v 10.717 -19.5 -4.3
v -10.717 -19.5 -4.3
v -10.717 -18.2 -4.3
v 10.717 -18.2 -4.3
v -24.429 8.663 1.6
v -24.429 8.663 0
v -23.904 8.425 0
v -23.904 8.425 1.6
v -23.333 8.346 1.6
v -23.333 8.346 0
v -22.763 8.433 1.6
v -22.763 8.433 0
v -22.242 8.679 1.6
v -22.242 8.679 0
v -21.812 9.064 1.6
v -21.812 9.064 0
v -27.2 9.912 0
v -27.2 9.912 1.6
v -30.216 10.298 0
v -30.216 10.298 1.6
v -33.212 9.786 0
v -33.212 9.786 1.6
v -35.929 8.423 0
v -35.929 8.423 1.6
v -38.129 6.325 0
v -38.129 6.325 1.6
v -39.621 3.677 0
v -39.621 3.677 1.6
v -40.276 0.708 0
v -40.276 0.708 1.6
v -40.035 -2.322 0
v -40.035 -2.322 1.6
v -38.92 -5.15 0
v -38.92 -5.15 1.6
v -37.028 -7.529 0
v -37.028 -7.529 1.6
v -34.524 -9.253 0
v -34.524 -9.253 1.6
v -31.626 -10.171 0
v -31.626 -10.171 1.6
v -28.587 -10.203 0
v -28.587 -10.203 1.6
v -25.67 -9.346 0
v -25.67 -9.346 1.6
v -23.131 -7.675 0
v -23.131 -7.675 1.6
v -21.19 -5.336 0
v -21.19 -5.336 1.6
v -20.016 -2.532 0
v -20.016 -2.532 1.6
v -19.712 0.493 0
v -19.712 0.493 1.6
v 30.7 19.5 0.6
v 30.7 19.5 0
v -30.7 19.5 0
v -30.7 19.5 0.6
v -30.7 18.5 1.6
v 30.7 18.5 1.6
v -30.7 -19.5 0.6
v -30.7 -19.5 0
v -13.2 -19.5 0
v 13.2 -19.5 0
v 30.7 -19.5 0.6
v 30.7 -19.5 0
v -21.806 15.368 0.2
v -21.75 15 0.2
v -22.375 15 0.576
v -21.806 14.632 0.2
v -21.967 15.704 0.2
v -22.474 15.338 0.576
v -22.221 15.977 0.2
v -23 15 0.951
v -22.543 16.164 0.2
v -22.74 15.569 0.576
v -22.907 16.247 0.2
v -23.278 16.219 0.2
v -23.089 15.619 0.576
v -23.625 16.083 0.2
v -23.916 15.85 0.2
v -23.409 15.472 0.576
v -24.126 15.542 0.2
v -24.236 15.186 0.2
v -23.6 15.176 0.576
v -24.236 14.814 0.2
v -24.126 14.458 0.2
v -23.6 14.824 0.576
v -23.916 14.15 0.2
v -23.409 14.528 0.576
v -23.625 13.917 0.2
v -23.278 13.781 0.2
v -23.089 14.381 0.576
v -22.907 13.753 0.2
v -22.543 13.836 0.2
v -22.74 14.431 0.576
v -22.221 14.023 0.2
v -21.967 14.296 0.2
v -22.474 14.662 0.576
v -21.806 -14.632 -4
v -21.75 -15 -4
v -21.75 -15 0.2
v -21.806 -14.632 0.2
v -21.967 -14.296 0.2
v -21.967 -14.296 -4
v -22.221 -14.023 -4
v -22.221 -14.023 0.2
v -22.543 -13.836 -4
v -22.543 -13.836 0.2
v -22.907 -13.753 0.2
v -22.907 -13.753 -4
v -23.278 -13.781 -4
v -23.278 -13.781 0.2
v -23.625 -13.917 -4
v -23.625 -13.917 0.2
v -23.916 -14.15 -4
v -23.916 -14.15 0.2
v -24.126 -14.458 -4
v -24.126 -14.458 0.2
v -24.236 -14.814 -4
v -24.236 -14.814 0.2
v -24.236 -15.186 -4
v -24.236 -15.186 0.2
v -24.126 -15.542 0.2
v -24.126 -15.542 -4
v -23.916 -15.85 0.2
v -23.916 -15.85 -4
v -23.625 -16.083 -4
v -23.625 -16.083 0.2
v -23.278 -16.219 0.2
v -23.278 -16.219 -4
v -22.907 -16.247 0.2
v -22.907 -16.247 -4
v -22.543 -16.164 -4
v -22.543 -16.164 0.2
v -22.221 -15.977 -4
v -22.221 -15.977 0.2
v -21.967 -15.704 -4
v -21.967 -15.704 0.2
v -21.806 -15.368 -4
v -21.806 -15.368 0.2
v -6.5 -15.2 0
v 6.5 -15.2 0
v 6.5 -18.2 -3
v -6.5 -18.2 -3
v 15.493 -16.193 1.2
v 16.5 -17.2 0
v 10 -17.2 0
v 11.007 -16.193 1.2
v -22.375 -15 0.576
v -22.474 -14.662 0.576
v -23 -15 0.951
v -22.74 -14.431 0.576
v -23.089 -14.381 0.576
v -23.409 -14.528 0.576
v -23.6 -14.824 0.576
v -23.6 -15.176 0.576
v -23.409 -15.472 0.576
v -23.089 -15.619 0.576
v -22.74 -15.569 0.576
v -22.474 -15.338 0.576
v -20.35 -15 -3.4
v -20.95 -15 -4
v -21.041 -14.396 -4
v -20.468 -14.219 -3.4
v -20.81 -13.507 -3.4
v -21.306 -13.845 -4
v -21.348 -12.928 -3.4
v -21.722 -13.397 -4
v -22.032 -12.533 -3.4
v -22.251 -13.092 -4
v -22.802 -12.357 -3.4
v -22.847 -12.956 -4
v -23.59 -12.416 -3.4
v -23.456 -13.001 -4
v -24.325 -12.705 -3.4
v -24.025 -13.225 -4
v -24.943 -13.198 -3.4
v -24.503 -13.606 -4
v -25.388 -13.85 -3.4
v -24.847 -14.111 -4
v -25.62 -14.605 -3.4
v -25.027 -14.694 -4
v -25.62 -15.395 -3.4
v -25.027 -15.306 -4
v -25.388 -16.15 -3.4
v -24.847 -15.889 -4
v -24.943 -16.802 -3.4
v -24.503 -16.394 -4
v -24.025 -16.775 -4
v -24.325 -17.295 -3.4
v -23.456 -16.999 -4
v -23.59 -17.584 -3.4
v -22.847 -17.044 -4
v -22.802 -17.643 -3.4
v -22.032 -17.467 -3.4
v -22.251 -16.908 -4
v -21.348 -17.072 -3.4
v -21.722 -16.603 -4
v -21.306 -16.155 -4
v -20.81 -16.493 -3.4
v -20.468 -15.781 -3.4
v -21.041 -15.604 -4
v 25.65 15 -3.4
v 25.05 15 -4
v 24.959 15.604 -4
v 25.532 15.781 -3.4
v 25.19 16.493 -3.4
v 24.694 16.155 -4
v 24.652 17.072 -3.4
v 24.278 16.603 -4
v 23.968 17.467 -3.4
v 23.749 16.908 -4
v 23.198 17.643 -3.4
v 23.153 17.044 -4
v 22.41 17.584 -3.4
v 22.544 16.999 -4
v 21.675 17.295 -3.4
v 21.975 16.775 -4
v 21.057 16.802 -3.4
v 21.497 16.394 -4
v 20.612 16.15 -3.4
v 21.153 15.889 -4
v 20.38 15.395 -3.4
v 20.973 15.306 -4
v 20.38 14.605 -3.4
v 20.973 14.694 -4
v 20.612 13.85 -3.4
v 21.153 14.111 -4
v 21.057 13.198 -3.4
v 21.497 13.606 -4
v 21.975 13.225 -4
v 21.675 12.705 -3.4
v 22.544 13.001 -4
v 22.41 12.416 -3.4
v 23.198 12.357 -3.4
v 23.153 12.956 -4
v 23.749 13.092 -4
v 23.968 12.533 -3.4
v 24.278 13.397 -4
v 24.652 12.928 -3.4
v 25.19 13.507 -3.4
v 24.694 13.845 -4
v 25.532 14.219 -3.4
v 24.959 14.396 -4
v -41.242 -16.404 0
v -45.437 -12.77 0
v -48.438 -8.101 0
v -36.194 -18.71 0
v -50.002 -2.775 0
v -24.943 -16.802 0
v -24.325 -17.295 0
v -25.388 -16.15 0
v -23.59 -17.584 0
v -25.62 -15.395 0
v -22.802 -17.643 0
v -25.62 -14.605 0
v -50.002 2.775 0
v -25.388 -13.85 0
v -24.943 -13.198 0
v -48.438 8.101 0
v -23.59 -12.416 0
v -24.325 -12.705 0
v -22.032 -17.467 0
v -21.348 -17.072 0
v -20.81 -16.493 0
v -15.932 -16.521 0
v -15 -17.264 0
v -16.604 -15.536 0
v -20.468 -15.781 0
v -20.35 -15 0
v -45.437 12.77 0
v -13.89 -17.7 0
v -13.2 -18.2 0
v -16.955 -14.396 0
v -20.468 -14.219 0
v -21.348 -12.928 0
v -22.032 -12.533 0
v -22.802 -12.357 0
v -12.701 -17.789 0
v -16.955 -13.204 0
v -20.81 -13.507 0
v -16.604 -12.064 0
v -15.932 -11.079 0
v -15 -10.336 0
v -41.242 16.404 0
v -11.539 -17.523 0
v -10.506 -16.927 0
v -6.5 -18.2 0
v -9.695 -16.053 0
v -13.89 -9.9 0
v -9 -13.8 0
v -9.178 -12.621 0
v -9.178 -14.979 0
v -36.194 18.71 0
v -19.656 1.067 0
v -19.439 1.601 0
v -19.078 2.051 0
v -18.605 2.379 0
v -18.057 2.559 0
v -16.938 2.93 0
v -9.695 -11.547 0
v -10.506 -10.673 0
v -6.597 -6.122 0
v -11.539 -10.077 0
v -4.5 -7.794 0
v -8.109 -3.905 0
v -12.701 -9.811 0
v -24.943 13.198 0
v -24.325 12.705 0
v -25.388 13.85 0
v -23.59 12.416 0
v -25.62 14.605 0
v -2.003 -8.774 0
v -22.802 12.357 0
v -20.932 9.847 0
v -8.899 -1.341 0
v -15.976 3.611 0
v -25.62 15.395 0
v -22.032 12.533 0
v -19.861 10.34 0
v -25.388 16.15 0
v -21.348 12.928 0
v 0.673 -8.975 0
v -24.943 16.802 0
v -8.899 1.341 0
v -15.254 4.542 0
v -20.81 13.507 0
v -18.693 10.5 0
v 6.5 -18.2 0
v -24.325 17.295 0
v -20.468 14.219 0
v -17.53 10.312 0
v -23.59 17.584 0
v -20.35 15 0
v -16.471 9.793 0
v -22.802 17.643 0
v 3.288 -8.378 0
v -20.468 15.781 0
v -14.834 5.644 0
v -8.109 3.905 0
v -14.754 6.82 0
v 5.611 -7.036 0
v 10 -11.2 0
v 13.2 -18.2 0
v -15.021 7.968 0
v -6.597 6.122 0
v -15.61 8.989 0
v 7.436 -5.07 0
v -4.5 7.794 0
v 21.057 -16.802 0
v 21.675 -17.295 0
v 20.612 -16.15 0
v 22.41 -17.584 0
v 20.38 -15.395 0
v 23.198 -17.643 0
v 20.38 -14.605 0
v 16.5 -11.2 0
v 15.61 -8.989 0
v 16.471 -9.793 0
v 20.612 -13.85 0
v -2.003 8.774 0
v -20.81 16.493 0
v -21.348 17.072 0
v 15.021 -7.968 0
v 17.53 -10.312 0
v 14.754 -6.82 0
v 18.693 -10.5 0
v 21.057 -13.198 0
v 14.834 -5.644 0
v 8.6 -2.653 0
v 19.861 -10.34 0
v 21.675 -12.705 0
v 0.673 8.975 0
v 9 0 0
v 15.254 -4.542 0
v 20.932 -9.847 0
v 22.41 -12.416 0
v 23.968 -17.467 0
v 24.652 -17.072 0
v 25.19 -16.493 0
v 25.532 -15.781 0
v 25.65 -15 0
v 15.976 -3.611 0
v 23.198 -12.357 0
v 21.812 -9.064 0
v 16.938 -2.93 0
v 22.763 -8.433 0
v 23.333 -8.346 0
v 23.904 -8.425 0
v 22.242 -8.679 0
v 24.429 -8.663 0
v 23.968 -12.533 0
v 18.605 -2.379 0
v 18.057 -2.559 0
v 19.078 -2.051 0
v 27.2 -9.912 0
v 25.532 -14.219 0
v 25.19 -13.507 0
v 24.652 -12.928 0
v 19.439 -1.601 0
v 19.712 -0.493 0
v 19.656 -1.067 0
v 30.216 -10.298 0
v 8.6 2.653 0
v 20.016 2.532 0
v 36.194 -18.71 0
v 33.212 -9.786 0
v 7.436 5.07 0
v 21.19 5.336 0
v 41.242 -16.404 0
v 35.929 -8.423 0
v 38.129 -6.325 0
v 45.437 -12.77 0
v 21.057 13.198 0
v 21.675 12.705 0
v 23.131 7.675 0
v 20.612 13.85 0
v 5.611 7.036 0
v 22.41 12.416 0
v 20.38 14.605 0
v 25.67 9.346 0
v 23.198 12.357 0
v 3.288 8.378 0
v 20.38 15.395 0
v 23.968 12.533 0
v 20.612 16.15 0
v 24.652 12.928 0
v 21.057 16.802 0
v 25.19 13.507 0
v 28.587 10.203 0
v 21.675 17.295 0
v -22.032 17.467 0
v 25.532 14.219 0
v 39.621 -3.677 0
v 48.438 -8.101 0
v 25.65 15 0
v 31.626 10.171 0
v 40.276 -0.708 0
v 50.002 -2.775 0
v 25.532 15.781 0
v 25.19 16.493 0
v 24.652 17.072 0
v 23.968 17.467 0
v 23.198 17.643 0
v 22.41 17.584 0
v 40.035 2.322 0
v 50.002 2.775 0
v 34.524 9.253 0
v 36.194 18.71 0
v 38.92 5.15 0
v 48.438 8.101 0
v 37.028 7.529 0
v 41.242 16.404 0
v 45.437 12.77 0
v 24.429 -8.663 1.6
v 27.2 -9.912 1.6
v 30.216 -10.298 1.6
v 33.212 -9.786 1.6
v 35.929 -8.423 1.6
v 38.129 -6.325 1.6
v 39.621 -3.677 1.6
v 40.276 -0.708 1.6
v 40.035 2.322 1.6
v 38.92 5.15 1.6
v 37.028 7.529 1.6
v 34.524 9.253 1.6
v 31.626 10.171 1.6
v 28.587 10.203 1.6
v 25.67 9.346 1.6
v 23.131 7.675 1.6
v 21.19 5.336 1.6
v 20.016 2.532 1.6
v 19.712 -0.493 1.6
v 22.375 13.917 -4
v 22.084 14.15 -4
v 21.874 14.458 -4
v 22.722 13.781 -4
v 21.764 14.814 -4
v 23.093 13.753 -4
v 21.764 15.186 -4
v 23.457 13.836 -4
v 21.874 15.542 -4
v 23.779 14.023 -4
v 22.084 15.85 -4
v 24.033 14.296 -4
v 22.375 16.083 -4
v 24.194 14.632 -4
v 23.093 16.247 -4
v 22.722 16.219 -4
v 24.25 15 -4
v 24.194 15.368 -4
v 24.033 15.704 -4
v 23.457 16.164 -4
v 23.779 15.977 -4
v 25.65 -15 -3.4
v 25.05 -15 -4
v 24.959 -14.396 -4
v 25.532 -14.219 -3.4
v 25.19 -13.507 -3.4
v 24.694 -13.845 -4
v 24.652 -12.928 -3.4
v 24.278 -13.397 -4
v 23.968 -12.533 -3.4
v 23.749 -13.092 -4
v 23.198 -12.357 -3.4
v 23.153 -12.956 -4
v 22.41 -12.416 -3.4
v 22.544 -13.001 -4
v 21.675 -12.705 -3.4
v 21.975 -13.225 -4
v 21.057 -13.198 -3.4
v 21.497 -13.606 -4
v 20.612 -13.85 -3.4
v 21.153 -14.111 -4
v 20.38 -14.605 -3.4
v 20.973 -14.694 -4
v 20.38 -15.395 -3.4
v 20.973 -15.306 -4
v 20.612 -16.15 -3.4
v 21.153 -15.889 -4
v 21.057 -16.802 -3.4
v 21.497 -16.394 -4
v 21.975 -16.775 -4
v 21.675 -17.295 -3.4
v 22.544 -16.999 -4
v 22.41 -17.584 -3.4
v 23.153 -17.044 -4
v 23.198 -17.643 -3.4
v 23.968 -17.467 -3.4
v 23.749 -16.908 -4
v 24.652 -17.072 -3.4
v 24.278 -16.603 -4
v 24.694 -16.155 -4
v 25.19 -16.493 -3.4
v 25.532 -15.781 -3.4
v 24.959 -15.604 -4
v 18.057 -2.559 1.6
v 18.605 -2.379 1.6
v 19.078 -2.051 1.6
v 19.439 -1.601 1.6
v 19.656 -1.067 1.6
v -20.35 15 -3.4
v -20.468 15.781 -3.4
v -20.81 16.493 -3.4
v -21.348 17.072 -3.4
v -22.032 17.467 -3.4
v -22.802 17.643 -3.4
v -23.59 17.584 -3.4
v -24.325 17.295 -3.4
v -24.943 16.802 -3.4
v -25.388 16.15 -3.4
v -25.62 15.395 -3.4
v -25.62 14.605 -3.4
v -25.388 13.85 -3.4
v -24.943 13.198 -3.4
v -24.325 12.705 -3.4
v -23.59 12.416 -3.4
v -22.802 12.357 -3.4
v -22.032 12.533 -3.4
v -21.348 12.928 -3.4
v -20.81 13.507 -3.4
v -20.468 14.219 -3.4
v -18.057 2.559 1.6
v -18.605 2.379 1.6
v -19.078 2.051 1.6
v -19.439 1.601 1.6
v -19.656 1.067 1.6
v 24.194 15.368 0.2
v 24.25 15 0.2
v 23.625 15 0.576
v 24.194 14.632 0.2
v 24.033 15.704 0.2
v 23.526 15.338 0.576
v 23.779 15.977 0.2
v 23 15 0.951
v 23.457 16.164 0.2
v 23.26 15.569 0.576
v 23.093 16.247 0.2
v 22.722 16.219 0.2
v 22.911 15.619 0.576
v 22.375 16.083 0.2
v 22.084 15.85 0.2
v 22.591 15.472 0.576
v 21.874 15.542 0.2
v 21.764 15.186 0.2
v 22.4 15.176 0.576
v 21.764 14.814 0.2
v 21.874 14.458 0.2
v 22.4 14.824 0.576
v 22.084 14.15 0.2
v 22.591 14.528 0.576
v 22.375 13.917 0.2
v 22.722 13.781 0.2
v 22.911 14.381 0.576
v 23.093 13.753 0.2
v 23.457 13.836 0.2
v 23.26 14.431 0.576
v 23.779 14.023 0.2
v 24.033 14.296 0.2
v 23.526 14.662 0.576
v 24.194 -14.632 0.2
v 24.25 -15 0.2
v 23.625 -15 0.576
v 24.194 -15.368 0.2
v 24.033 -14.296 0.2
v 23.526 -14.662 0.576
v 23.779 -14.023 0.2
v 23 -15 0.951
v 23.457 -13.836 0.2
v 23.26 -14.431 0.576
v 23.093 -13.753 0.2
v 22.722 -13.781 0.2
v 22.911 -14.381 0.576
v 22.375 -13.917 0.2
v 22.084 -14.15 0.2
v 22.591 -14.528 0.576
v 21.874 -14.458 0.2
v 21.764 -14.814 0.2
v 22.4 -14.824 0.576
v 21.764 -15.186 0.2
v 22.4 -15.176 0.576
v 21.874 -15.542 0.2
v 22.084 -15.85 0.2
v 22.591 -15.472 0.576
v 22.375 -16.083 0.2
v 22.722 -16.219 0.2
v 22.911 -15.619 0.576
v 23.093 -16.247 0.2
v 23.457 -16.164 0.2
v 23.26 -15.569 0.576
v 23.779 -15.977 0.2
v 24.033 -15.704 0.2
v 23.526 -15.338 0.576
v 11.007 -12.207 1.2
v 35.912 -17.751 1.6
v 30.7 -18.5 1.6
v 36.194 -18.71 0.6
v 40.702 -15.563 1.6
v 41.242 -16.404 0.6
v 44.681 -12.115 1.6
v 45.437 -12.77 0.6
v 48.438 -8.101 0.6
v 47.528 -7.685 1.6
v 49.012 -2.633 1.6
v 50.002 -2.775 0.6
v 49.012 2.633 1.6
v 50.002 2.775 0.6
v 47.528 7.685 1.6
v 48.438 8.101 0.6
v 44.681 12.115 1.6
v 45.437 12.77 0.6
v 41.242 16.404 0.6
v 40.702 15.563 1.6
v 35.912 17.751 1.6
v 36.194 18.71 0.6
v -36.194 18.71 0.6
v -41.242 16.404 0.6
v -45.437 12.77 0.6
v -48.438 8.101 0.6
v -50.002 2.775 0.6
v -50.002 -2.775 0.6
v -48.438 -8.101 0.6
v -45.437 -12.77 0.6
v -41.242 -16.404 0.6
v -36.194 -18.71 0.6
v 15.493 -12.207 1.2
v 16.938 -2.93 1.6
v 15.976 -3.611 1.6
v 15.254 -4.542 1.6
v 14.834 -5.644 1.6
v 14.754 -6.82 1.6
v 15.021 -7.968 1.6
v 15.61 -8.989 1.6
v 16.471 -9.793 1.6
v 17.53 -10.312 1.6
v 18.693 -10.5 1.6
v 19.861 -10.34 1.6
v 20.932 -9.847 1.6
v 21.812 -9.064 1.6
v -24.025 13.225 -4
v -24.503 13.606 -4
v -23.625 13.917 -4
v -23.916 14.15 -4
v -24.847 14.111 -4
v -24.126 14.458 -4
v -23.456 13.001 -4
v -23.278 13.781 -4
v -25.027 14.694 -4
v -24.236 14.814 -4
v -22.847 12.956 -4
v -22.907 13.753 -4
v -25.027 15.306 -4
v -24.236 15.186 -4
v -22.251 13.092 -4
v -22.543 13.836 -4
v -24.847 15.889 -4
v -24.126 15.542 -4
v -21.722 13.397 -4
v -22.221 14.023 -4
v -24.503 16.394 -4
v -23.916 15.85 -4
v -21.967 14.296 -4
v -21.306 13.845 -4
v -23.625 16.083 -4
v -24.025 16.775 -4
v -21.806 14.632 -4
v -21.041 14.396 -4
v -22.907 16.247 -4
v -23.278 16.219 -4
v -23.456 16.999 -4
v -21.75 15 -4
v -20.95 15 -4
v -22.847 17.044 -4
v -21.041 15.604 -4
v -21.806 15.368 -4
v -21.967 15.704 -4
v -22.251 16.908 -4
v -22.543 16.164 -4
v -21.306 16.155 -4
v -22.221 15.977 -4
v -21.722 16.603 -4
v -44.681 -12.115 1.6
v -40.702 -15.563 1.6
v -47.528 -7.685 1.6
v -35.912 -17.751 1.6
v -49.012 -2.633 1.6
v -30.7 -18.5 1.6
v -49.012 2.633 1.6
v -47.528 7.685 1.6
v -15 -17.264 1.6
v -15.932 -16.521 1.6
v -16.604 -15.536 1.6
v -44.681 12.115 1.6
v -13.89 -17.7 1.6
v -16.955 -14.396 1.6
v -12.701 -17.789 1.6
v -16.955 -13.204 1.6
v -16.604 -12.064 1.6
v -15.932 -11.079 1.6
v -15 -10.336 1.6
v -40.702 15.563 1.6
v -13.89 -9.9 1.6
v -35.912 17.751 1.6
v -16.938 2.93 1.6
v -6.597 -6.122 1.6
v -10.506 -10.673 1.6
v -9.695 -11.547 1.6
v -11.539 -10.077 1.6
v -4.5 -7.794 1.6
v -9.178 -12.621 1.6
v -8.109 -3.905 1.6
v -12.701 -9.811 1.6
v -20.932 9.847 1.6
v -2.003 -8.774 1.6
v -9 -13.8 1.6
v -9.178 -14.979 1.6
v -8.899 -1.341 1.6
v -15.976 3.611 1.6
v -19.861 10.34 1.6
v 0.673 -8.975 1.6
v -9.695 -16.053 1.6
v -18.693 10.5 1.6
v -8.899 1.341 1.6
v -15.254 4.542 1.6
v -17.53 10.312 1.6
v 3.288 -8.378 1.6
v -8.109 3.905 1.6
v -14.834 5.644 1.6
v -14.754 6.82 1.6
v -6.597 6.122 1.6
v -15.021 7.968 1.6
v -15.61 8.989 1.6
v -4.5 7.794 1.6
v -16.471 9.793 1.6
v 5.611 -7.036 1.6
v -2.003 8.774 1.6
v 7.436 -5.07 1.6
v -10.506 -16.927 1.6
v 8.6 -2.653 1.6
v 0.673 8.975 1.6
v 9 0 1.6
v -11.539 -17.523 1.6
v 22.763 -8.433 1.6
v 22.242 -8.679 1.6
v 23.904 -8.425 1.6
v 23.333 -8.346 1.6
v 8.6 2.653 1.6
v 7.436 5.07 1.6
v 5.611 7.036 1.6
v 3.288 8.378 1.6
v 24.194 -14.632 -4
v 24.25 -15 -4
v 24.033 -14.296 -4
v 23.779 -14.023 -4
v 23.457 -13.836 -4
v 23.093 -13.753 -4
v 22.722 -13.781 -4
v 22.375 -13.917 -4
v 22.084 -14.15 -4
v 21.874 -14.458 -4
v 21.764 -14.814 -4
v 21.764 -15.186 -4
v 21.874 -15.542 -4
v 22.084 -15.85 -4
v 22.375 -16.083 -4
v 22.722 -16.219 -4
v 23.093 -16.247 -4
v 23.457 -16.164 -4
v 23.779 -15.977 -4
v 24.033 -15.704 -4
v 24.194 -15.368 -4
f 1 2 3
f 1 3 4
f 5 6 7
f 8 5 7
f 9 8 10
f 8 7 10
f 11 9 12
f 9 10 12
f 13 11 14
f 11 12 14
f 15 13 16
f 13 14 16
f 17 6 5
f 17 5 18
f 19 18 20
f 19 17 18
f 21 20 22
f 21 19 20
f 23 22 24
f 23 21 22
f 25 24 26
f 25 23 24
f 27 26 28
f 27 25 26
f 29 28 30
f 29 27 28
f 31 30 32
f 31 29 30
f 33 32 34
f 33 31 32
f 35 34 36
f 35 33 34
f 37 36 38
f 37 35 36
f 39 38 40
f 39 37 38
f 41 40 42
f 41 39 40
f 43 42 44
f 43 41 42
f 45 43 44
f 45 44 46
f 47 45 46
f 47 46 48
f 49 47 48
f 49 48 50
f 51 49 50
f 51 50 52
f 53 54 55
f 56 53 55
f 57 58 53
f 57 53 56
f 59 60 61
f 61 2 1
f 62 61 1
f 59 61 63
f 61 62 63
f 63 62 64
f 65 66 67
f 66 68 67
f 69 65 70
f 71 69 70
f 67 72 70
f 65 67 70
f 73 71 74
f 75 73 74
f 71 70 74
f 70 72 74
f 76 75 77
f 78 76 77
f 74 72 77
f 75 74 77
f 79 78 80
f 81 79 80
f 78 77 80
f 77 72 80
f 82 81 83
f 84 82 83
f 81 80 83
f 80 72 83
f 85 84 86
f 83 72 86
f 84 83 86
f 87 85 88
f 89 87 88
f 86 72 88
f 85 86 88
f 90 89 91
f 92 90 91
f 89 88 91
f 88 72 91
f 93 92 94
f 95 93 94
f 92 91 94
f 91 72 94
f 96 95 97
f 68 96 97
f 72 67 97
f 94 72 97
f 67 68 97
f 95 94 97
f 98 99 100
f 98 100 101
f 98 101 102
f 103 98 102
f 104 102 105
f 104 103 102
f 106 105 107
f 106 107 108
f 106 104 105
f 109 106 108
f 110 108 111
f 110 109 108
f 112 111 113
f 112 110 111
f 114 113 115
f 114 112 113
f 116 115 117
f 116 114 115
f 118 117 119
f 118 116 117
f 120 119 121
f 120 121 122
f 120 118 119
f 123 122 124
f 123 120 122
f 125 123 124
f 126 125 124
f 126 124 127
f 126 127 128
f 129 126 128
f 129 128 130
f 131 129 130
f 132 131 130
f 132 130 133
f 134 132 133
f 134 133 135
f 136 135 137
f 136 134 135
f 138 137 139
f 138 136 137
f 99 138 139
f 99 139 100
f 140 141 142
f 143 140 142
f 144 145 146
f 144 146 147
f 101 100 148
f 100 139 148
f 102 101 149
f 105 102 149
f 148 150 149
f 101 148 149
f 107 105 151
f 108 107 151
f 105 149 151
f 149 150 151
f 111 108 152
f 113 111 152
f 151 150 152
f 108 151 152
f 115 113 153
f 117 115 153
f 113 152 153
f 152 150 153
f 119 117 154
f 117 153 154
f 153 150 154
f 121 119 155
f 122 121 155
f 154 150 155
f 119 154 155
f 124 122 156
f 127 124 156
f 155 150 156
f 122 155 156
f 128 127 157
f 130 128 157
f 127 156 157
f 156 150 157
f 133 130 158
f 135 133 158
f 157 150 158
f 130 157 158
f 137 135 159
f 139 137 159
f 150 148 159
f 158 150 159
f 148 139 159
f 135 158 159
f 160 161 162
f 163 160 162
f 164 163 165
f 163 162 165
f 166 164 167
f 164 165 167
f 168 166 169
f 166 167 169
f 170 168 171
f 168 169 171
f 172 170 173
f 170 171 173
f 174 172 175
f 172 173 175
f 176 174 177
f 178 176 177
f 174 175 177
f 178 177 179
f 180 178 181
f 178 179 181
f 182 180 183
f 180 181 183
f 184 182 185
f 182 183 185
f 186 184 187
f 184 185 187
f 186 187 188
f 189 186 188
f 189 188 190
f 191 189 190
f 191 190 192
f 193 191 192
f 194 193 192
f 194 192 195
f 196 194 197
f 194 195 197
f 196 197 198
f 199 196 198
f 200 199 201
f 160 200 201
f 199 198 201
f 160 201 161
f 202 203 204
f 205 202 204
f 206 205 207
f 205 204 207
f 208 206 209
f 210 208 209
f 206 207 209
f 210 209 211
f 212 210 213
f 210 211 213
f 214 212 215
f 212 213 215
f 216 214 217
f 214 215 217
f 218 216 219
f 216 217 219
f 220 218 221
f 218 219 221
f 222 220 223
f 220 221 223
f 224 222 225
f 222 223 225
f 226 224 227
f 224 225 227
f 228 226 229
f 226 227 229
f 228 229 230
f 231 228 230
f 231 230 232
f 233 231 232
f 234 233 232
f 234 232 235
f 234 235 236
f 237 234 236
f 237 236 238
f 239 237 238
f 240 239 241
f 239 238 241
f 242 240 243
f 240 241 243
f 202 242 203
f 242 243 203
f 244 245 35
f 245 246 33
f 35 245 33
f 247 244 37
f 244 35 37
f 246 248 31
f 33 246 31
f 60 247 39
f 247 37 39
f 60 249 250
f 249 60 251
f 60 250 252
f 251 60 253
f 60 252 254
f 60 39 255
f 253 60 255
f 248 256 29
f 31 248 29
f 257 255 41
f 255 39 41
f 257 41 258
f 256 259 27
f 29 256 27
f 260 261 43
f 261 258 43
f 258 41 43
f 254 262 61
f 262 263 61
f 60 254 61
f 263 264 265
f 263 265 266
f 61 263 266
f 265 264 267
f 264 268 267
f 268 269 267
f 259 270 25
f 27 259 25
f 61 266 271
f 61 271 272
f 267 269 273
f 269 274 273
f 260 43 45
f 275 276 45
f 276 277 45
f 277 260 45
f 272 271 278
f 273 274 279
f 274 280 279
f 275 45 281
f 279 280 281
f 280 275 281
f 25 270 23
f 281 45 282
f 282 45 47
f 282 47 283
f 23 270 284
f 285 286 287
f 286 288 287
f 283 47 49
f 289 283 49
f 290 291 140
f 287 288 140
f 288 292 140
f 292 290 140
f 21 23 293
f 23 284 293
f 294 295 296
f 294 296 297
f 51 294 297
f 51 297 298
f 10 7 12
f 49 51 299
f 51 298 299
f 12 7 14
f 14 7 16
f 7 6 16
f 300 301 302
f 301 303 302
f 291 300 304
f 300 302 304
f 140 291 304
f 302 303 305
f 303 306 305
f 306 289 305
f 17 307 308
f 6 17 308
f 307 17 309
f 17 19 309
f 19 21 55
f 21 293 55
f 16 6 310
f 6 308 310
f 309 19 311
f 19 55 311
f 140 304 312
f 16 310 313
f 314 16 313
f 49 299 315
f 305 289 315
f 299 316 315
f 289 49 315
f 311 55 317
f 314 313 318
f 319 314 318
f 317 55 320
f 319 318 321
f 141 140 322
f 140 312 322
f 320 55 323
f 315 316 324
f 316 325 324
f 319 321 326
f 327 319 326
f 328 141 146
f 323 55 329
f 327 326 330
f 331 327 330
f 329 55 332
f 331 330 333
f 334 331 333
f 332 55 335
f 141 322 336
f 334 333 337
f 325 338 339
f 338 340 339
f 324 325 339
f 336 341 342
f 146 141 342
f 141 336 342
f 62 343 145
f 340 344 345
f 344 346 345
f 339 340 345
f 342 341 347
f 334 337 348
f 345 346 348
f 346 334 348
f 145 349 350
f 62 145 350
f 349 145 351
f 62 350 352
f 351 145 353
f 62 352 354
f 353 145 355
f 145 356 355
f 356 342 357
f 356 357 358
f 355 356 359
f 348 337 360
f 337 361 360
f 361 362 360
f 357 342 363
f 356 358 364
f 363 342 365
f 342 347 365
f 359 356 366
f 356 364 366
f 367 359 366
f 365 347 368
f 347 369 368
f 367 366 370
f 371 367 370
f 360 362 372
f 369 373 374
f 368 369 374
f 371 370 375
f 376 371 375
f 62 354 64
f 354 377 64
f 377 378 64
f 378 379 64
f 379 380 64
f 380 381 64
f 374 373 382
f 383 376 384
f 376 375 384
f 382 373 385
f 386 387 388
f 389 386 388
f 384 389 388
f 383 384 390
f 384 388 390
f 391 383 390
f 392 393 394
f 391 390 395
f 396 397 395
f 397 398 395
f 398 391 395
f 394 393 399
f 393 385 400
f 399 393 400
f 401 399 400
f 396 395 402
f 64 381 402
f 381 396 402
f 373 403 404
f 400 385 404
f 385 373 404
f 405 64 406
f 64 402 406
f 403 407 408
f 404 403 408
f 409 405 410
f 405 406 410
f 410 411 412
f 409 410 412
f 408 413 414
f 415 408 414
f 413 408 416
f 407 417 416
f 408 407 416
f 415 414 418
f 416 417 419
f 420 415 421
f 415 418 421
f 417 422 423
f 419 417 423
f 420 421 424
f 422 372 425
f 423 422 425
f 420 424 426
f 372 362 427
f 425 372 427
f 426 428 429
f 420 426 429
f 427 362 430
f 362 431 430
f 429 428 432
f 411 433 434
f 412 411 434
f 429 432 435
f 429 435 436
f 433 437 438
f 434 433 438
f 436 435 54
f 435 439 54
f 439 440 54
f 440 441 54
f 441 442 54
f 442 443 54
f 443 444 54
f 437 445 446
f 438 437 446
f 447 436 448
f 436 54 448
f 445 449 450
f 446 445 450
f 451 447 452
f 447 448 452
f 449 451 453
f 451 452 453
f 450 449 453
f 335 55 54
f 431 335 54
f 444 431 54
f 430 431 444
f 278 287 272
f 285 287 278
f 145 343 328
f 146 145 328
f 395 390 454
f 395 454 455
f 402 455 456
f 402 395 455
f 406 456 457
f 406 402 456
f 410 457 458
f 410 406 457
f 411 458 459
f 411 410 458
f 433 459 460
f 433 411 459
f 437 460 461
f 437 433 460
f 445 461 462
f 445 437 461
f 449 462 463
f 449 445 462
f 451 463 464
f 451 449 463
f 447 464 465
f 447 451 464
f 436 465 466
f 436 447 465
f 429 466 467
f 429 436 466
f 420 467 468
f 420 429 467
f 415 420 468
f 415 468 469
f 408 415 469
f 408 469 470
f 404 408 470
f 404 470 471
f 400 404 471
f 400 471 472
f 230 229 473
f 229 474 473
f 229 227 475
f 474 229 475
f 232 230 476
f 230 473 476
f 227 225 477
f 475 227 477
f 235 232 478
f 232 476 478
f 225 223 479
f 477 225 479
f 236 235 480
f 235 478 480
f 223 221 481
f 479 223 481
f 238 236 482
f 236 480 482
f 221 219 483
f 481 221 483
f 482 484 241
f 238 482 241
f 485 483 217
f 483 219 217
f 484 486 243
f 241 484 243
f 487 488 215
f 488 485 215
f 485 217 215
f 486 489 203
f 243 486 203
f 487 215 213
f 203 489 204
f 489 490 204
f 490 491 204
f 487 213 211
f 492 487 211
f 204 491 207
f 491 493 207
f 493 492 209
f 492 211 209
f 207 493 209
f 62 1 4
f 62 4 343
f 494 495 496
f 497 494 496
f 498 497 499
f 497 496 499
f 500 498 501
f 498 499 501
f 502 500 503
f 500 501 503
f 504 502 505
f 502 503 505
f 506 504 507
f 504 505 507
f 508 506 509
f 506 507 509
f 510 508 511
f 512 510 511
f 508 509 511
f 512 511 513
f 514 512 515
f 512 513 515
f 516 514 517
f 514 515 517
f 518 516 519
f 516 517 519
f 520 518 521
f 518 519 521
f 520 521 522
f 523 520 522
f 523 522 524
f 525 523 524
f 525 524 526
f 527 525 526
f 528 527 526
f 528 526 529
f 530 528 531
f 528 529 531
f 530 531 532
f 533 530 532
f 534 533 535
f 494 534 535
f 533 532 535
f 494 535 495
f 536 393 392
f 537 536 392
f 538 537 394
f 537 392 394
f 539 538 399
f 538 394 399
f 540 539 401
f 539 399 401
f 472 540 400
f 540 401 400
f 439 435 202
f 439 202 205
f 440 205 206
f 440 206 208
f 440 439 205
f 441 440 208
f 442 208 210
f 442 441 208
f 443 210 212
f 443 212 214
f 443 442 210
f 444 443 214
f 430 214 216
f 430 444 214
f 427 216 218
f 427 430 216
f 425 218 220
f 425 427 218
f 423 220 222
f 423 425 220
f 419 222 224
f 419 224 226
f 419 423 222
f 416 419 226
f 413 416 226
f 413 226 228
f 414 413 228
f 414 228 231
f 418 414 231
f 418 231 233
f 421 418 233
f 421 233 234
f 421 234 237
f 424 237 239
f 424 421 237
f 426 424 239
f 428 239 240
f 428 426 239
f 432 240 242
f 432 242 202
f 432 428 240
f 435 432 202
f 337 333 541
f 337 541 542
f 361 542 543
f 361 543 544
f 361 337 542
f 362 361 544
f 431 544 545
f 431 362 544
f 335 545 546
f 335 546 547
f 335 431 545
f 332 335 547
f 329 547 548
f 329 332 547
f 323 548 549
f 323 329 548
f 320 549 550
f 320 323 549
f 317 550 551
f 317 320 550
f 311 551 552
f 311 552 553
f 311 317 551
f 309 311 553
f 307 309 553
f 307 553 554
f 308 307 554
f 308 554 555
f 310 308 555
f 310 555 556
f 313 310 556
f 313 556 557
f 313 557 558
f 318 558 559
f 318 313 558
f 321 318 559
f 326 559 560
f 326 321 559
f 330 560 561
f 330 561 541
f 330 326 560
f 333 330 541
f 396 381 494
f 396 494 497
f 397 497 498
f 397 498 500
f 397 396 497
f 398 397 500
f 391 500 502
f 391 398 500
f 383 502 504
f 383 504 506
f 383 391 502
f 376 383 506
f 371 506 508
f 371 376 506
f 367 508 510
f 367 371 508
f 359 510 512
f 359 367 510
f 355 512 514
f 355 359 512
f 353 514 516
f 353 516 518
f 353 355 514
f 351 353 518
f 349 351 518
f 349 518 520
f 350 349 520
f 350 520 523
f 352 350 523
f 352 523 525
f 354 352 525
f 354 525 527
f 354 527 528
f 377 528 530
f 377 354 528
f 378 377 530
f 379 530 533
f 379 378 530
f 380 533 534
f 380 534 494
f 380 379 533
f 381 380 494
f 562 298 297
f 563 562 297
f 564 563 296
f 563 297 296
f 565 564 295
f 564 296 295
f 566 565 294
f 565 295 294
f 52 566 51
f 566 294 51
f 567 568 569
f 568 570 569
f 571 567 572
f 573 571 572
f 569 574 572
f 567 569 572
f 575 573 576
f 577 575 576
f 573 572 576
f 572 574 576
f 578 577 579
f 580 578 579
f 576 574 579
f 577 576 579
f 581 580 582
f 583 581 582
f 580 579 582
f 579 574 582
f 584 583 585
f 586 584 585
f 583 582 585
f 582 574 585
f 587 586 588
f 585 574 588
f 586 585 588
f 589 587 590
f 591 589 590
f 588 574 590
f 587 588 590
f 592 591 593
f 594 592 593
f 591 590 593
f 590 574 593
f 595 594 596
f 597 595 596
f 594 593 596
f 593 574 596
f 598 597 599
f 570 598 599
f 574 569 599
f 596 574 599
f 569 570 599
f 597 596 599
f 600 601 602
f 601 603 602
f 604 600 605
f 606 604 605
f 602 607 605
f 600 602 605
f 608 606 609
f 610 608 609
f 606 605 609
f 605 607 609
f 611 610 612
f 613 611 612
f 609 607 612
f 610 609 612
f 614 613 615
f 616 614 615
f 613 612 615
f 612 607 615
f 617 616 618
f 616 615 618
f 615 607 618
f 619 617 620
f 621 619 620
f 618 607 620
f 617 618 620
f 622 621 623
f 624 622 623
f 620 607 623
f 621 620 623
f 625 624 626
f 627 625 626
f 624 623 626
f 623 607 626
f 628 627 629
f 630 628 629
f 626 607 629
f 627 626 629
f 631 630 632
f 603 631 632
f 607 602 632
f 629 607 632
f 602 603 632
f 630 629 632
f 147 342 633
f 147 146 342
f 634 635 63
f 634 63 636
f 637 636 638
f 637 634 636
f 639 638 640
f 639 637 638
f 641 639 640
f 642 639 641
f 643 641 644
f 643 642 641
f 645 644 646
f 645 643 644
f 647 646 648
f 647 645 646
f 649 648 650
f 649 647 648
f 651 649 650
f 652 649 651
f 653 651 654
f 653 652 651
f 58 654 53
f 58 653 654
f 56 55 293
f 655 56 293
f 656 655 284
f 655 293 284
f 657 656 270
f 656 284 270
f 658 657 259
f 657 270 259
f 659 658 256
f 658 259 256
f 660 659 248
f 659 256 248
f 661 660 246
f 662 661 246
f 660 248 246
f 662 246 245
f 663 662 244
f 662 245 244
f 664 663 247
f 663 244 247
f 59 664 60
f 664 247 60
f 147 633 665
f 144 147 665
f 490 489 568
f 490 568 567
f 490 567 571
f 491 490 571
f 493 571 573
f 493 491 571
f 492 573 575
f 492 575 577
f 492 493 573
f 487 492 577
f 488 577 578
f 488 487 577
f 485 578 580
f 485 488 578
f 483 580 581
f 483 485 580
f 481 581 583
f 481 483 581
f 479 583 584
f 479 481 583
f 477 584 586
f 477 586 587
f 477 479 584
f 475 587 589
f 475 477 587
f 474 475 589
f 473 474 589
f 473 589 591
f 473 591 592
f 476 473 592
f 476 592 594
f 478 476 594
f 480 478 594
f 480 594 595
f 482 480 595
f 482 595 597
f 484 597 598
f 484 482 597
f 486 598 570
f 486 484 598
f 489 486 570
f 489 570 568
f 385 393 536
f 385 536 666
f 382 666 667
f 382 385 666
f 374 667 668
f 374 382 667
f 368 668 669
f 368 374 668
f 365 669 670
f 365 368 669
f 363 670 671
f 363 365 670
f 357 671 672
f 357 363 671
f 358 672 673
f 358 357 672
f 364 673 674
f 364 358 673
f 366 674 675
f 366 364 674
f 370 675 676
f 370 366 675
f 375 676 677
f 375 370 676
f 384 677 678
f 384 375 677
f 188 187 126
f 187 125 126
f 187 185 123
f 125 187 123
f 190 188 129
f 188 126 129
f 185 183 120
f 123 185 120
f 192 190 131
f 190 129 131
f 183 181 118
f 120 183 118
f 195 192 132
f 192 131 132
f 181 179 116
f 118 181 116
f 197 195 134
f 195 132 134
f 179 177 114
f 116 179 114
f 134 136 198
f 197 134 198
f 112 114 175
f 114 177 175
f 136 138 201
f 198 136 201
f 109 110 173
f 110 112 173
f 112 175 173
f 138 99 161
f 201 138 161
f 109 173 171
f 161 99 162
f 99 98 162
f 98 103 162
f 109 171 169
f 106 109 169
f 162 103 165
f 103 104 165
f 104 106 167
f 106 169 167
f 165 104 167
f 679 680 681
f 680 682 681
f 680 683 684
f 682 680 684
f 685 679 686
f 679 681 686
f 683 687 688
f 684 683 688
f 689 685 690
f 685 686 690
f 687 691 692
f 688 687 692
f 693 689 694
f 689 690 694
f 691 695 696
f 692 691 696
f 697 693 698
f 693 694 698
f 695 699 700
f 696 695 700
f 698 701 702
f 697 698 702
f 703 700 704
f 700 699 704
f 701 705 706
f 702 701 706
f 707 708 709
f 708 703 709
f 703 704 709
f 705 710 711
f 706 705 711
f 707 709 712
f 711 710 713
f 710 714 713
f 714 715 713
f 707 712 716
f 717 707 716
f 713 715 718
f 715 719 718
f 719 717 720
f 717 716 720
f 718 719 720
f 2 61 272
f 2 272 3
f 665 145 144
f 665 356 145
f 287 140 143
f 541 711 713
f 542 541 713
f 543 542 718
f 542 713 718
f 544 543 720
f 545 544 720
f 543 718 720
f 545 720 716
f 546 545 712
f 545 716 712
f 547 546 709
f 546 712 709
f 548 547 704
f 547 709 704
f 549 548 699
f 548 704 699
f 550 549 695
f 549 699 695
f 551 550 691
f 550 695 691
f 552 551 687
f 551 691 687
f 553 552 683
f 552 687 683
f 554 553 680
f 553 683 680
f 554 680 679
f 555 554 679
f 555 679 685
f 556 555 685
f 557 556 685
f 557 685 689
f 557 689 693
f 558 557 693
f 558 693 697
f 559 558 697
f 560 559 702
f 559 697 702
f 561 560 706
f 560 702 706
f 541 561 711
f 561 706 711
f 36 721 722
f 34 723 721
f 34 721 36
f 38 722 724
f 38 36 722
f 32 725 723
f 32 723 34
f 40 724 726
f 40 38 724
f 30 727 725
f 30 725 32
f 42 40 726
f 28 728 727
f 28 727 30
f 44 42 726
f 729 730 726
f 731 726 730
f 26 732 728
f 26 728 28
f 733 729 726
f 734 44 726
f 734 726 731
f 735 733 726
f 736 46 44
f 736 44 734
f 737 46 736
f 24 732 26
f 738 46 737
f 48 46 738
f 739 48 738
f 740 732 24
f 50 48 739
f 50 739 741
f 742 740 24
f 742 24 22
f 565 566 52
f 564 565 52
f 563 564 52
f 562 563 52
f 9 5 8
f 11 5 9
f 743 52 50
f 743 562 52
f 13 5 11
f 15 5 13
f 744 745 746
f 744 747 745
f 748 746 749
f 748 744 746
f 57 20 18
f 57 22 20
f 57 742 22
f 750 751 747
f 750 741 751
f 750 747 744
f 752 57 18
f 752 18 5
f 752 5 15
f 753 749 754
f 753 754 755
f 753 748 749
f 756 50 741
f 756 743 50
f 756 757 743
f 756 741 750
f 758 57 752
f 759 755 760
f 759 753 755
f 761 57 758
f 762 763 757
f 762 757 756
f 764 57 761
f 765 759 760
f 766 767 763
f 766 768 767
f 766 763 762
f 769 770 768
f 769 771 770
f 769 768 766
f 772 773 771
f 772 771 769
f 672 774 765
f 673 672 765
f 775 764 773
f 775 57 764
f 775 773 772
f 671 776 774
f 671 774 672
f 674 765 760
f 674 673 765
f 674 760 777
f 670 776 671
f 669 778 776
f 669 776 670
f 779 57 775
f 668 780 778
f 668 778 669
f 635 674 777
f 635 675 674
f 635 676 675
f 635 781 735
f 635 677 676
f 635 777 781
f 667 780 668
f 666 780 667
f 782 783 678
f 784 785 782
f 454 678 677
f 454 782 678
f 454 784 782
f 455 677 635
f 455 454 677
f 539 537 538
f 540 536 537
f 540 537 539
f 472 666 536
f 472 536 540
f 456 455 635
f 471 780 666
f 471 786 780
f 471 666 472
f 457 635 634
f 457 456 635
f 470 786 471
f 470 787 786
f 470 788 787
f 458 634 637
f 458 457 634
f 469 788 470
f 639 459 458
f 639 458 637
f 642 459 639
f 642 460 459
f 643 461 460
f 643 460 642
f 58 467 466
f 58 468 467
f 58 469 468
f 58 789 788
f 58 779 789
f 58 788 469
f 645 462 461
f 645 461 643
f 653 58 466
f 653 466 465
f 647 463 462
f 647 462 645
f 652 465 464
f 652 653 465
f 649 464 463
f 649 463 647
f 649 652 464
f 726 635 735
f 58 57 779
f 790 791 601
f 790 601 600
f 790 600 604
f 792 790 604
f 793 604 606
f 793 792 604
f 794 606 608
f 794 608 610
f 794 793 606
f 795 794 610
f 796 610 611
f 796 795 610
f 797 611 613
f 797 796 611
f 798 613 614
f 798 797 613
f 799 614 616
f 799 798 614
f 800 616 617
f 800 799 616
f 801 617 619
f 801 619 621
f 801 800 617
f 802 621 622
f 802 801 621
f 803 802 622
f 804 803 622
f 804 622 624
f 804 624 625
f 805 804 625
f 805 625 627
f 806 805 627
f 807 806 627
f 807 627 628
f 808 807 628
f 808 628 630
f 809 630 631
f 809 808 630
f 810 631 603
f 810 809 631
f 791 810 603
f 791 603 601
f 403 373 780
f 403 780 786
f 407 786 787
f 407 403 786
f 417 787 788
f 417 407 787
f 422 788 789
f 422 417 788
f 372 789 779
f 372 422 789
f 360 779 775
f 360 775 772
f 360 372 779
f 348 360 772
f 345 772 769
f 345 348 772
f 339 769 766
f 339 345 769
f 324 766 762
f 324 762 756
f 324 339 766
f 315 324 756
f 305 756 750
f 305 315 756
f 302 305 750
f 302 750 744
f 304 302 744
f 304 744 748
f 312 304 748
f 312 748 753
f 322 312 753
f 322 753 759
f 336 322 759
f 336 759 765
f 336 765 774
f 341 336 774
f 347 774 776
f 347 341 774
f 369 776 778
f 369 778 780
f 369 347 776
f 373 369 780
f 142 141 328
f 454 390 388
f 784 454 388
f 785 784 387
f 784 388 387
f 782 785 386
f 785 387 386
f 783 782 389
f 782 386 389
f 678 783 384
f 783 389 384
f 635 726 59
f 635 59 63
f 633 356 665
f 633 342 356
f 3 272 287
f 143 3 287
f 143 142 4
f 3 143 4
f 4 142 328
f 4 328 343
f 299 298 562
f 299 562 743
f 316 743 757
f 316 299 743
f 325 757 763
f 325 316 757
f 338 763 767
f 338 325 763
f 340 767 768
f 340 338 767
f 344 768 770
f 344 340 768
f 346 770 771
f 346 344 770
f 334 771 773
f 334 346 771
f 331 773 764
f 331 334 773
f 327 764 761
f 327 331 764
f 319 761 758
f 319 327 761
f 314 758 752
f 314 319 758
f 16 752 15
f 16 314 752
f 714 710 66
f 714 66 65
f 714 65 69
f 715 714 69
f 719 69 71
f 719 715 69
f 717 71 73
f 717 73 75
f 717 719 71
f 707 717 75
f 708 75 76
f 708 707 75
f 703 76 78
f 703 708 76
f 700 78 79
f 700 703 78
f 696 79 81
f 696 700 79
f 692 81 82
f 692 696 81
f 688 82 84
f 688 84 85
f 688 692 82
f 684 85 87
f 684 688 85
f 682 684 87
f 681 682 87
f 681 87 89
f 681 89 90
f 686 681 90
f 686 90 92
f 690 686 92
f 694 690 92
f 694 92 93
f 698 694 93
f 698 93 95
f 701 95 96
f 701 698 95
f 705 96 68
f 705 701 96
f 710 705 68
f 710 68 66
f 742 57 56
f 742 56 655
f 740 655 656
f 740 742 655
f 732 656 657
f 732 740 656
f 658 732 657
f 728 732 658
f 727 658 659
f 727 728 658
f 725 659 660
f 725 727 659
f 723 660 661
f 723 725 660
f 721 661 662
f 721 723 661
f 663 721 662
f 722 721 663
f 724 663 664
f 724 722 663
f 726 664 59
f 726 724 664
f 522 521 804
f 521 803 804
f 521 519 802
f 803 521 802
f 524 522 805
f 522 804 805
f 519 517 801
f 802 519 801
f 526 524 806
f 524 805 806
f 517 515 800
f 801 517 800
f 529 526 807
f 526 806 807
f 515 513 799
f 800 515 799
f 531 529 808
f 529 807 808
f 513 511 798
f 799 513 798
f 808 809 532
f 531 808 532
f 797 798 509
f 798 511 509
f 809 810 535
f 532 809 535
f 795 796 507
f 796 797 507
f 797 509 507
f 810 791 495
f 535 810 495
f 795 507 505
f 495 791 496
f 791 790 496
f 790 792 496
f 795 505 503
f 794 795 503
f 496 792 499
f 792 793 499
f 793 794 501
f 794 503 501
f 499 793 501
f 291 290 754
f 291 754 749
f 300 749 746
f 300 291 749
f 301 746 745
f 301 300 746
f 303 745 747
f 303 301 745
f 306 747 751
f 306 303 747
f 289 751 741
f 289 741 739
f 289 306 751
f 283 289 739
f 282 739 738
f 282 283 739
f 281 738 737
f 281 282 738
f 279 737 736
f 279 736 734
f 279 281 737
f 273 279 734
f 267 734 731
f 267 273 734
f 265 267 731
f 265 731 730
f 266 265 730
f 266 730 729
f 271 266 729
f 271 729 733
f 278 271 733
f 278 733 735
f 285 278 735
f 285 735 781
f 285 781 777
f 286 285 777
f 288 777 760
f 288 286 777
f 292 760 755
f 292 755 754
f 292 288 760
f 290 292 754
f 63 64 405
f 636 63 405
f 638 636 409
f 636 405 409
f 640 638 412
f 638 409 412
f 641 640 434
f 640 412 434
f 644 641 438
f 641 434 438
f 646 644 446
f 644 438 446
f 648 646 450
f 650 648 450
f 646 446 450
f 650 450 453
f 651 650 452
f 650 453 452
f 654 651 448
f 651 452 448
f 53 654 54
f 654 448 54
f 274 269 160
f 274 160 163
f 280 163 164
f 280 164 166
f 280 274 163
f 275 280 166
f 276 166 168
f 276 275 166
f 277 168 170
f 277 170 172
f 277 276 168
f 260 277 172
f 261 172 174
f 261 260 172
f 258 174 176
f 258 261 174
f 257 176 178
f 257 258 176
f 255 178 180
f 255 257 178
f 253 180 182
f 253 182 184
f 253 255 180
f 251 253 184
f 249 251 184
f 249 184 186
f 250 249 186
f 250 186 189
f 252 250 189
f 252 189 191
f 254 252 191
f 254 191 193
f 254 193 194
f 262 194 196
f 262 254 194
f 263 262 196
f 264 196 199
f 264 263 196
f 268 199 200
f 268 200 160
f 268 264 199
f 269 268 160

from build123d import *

# Parameters (mm, degrees)
SKETCH014_R     = 9
SKETCH014_R_2   = 4
PAD003_DEPTH    = 1.6
SKETCH015_W     = 6.5
SKETCH015_H     = 6
POCKET007_DEPTH = 1.2
POCKET007_TAPER = 40
SKETCH016_R     = 2.65
PAD004_DEPTH    = 4
SKETCH017_R     = 1.25
HOLE001_DEPTH   = 4.2
HOLE001_TIPS_R  = 1.25
PAD005_DEPTH    = 1.3
PAD006_DEPTH    = 6.5
CHAMFER003_SIZE = 0.6
CHAMFER004_SIZE = 1


with BuildPart() as part:
    # Sketch014 → Pad003 (new body)
    with BuildSketch(Plane.XY):
        with BuildLine():
            Line((-30.7, -19.5), (30.7, -19.5))
            ThreePointArc((30.7, -19.5), (50.2, 0), (30.7, 19.5))
            Line((30.7, 19.5), (-30.7, 19.5))
            ThreePointArc((-30.7, 19.5), (-50.2, 0), (-30.7, -19.5))
        make_face()
        Circle(SKETCH014_R, mode=Mode.SUBTRACT)
        with Locations((-13, -13.8)):
            Circle(SKETCH014_R_2, mode=Mode.SUBTRACT)
        with BuildLine():
            ThreePointArc((-24.429009, 8.663375), (-38.920062, -5.15), (-19.711802, 0.492933))
            ThreePointArc((-18.056619, 2.559098), (-19.275002, 1.839074), (-19.711802, 0.492933))
            ThreePointArc((-18.056619, 2.559098), (-15.277568, 8.5), (-21.812065, 9.063722))
            ThreePointArc((-24.429009, 8.663375), (-23.044816, 8.368584), (-21.812065, 9.063722))
        make_face(mode=Mode.SUBTRACT)
        with BuildLine():
            ThreePointArc((24.429009, -8.663375), (38.920062, 5.15), (19.711802, -0.492933))
            ThreePointArc((18.056619, -2.559098), (19.275002, -1.839074), (19.711802, -0.492933))
            ThreePointArc((18.056619, -2.559098), (15.277568, -8.5), (21.812065, -9.063722))
            ThreePointArc((24.429009, -8.663375), (23.044816, -8.368584), (21.812065, -9.063722))
        make_face(mode=Mode.SUBTRACT)
    extrude(amount=PAD003_DEPTH)

    # Sketch015 → Pocket007 (cut)
    with BuildSketch(Plane.XY):
        with Locations((13.25, -14.2)):
            Rectangle(SKETCH015_W, SKETCH015_H)
    extrude(amount=POCKET007_DEPTH, taper=POCKET007_TAPER, mode=Mode.SUBTRACT)

    # Sketch016 → Pad004 (join)
    with BuildSketch(Plane.XY):
        with Locations((-23, 15)):
            Circle(SKETCH016_R)
        with Locations((23, 15)):
            Circle(SKETCH016_R)
        with Locations((23, -15)):
            Circle(SKETCH016_R)
        with Locations((-23, -15)):
            Circle(SKETCH016_R)
    extrude(amount=-PAD004_DEPTH)

    # Sketch017 → Hole001 (cut)
    with BuildSketch(Plane.XY.offset(-4)):
        with Locations((-23, 15)):
            Circle(SKETCH017_R)
        with Locations((23, 15)):
            Circle(SKETCH017_R)
        with Locations((23, -15)):
            Circle(SKETCH017_R)
        with Locations((-23, -15)):
            Circle(SKETCH017_R)
    extrude(amount=HOLE001_DEPTH, mode=Mode.SUBTRACT)

    # Hole001 tips → Hole001 tip 1 section 0
    with BuildSketch(Plane.XY.offset(0.2), mode=Mode.PRIVATE) as hole001_tip_1_s0:
        with Locations((-23, 15)):
            Circle(HOLE001_TIPS_R)
    loft([hole001_tip_1_s0.sketch, Vertex(-23, 15, 0.951076)], mode=Mode.SUBTRACT)

    # Hole001 tips → Hole001 tip 2 section 0
    with BuildSketch(Plane.XY.offset(0.2), mode=Mode.PRIVATE) as hole001_tip_2_s0:
        with Locations((23, 15)):
            Circle(HOLE001_TIPS_R)
    loft([hole001_tip_2_s0.sketch, Vertex(23, 15, 0.951076)], mode=Mode.SUBTRACT)

    # Hole001 tips → Hole001 tip 3 section 0
    with BuildSketch(Plane.XY.offset(0.2), mode=Mode.PRIVATE) as hole001_tip_3_s0:
        with Locations((23, -15)):
            Circle(HOLE001_TIPS_R)
    loft([hole001_tip_3_s0.sketch, Vertex(23, -15, 0.951076)], mode=Mode.SUBTRACT)

    # Hole001 tips → Hole001 tip 4 section 0
    with BuildSketch(Plane.XY.offset(0.2), mode=Mode.PRIVATE) as hole001_tip_4_s0:
        with Locations((-23, -15)):
            Circle(HOLE001_TIPS_R)
    loft([hole001_tip_4_s0.sketch, Vertex(-23, -15, 0.951076)], mode=Mode.SUBTRACT)

    # Sketch018 → Pad005 (join)
    with BuildSketch(Plane.XZ.offset(19.5)):
        Polygon((-13.2, 0), (-10.717394, -4.3), (10.717394, -4.3), (13.2, 0), align=None)
    extrude(amount=-PAD005_DEPTH)

    # Sketch019 → Pad006 (join, symmetric)
    with BuildSketch(Plane.YZ):
        Polygon((-18.2, -3), (-18.2, 0), (-15.2, 0), align=None)
    extrude(amount=PAD006_DEPTH, both=True)

    # Chamfer003
    chamfer003_edges = [part.edges().sort_by_distance(p)[0] for p in [
        (-25.65, -15, -4),
        (-25.65, 15, -4),
        (20.35, 15, -4),
        (20.35, -15, -4),
    ]]
    chamfer(chamfer003_edges, length=CHAMFER003_SIZE)

    # Chamfer004
    chamfer004_edges = [part.edges().sort_by_distance(p)[0] for p in [
        (-50.2, 0, 1.6),
    ]]
    chamfer(chamfer004_edges, length=CHAMFER004_SIZE)


solid = part.part
